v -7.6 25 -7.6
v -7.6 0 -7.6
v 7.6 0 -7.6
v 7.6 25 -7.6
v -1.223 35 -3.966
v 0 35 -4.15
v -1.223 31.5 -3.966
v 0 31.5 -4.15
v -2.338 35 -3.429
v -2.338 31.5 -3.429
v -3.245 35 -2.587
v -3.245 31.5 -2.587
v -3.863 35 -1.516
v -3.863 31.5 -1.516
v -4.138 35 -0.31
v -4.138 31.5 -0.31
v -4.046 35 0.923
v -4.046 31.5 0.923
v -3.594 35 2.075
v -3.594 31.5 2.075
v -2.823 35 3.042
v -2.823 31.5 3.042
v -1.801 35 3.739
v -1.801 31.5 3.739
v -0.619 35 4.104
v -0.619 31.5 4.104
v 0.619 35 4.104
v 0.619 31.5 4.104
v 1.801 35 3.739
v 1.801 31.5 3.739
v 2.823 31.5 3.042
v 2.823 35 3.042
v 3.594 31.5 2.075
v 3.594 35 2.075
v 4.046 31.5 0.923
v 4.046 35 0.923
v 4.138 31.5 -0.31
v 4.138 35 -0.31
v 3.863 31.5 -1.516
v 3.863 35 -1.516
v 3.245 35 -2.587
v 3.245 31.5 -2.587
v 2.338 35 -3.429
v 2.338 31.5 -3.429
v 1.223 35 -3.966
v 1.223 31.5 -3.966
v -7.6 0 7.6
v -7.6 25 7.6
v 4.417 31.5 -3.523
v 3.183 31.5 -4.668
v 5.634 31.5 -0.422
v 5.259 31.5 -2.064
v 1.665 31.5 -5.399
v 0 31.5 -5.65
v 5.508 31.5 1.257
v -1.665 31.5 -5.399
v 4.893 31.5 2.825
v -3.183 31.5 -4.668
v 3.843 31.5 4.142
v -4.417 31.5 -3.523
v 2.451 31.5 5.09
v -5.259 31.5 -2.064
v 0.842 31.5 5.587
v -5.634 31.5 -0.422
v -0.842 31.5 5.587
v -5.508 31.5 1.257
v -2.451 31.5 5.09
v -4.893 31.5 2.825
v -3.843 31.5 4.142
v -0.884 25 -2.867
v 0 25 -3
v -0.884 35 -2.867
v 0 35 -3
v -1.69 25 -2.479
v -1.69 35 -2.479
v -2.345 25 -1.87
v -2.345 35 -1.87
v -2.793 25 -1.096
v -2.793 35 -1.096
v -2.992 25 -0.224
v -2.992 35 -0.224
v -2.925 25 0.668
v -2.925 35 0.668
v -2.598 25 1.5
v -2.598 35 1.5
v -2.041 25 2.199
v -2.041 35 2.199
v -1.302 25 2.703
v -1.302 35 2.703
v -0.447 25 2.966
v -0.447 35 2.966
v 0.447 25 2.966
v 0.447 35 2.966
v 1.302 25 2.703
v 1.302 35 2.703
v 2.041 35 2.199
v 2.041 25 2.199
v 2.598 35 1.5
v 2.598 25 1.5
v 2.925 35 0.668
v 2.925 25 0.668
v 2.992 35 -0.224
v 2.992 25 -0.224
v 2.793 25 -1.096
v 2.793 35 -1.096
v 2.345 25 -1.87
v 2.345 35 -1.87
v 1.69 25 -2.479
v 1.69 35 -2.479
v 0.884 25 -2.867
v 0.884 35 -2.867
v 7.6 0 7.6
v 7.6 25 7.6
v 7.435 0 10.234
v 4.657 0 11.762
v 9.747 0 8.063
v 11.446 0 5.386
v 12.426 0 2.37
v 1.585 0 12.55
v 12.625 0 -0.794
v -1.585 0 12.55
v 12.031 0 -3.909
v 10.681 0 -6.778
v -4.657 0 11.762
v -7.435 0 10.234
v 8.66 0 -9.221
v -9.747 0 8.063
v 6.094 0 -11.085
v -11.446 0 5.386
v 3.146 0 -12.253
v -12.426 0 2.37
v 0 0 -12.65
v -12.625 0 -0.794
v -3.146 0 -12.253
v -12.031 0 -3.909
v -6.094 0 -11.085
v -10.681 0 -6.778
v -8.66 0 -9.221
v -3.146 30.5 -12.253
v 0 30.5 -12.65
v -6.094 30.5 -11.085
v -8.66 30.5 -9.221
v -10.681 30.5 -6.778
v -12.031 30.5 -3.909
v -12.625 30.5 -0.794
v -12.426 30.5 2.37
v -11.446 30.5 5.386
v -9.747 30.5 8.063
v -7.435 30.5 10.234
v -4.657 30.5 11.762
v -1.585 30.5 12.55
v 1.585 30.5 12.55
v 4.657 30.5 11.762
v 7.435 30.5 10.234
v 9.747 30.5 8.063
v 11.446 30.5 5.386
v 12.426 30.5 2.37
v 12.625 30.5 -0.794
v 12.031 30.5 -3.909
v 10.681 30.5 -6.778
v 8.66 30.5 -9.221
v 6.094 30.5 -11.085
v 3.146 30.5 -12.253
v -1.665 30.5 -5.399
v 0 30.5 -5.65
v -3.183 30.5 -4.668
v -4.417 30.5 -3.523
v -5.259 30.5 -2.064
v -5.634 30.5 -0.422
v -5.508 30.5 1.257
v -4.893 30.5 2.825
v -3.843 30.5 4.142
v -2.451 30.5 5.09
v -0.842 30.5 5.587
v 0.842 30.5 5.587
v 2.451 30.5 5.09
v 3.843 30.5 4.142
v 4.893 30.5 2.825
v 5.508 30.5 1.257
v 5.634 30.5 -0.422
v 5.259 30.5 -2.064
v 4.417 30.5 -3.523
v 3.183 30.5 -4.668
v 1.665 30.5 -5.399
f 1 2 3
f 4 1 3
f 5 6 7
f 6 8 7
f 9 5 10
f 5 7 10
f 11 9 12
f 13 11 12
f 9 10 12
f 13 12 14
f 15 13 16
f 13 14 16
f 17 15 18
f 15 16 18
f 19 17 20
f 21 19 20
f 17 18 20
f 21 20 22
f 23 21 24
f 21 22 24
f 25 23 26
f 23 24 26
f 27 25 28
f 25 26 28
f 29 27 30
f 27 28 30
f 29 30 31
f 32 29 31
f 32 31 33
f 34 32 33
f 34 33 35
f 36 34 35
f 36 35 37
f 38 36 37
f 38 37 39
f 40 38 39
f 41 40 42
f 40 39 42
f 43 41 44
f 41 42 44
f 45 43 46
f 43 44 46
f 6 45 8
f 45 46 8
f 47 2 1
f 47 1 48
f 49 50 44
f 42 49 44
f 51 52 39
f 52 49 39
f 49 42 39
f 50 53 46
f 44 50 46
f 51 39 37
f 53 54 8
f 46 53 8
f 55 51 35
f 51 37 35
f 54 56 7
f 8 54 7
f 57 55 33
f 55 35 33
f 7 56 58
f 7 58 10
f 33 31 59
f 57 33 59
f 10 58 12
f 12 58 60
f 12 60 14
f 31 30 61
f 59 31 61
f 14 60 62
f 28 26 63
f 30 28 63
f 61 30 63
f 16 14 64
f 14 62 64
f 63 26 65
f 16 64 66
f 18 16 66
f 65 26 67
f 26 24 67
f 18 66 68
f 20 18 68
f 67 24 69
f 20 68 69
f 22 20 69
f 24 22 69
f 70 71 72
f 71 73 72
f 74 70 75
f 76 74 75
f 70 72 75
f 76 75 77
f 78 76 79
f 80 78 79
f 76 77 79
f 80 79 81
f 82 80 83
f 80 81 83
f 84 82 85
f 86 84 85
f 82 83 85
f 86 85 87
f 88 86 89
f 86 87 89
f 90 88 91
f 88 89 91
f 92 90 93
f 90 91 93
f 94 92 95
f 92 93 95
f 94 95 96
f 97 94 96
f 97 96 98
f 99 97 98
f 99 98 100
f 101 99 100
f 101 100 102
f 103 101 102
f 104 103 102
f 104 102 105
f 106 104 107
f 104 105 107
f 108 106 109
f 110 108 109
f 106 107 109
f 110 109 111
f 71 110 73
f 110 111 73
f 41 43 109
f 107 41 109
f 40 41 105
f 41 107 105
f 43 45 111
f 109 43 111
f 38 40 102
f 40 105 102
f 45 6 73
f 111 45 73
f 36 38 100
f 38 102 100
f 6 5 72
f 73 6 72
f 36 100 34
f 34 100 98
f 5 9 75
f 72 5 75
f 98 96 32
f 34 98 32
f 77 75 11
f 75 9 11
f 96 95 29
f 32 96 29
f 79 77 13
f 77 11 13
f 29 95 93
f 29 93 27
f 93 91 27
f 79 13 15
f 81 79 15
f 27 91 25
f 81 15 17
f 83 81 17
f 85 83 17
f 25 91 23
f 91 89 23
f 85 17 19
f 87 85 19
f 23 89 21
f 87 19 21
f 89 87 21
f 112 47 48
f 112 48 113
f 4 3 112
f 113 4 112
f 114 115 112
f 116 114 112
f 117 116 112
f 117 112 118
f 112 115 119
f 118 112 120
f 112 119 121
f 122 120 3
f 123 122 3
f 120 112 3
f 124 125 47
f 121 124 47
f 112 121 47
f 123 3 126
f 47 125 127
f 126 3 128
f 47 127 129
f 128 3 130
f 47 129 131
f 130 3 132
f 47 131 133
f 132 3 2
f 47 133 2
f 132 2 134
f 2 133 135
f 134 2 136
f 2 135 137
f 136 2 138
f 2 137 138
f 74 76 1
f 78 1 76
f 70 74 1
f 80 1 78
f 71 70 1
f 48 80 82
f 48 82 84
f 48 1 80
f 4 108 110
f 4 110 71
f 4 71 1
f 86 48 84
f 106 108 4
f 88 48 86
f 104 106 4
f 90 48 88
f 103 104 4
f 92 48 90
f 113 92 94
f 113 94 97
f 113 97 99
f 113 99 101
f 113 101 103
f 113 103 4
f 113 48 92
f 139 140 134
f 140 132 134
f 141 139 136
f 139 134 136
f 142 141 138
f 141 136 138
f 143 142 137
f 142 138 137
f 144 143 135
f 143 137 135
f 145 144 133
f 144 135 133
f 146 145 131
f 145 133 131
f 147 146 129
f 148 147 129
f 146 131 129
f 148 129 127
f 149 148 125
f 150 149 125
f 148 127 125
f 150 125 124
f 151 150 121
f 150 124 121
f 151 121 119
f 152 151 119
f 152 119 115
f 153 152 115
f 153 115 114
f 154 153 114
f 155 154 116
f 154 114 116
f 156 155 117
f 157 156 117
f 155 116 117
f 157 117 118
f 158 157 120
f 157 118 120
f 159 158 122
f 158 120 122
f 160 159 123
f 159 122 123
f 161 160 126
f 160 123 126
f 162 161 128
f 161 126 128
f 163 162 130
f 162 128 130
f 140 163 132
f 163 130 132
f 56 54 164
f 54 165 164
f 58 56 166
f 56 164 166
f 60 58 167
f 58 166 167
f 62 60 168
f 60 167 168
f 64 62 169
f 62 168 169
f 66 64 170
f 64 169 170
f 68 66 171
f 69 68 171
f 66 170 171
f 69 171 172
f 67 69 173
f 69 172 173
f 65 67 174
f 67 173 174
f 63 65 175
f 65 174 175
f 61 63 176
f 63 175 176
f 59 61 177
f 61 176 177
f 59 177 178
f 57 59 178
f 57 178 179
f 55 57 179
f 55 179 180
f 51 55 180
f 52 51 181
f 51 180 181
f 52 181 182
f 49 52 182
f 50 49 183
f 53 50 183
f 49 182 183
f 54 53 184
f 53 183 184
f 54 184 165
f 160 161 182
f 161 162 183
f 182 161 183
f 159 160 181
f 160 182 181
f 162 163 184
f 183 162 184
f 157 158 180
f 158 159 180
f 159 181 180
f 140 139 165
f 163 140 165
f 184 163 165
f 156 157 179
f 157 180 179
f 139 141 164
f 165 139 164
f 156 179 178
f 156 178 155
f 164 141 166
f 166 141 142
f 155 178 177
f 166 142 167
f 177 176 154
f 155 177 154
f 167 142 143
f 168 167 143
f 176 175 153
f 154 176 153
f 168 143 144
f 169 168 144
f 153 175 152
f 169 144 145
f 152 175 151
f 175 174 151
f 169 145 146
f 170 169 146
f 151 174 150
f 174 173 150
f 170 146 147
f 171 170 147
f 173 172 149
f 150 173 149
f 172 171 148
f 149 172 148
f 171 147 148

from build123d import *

# Parameters (mm, degrees)
SKETCH_2_W          = 15.2
SKETCH_2_H          = 15.2
CUT_EXTRUDE_1_DEPTH = 25


with BuildPart() as part:
    # Эскиз1 → Повернуть1 (revolve)
    with BuildSketch(Plane.XY, mode=Mode.PRIVATE) as revolve_1_sk:
        Polygon((0, 20), (3, 20), (3, 35), (4.15, 35), (4.15, 31.5), (5.65, 31.5), (5.65, 30.5), (12.65, 30.5), (12.65, 0), (0, 0), align=None)
    revolve(revolve_1_sk.sketch.rotate(Axis((0, 0, 0), (0, 1, 0)), 90), axis=Axis((0, 0, 0), (0, 1, 0)))

    # Эскиз2 → Вырез-Вытянуть1 (cut)
    with BuildSketch(Plane.XZ):
        Rectangle(SKETCH_2_W, SKETCH_2_H)
    extrude(amount=-CUT_EXTRUDE_1_DEPTH, mode=Mode.SUBTRACT)


solid = part.part
